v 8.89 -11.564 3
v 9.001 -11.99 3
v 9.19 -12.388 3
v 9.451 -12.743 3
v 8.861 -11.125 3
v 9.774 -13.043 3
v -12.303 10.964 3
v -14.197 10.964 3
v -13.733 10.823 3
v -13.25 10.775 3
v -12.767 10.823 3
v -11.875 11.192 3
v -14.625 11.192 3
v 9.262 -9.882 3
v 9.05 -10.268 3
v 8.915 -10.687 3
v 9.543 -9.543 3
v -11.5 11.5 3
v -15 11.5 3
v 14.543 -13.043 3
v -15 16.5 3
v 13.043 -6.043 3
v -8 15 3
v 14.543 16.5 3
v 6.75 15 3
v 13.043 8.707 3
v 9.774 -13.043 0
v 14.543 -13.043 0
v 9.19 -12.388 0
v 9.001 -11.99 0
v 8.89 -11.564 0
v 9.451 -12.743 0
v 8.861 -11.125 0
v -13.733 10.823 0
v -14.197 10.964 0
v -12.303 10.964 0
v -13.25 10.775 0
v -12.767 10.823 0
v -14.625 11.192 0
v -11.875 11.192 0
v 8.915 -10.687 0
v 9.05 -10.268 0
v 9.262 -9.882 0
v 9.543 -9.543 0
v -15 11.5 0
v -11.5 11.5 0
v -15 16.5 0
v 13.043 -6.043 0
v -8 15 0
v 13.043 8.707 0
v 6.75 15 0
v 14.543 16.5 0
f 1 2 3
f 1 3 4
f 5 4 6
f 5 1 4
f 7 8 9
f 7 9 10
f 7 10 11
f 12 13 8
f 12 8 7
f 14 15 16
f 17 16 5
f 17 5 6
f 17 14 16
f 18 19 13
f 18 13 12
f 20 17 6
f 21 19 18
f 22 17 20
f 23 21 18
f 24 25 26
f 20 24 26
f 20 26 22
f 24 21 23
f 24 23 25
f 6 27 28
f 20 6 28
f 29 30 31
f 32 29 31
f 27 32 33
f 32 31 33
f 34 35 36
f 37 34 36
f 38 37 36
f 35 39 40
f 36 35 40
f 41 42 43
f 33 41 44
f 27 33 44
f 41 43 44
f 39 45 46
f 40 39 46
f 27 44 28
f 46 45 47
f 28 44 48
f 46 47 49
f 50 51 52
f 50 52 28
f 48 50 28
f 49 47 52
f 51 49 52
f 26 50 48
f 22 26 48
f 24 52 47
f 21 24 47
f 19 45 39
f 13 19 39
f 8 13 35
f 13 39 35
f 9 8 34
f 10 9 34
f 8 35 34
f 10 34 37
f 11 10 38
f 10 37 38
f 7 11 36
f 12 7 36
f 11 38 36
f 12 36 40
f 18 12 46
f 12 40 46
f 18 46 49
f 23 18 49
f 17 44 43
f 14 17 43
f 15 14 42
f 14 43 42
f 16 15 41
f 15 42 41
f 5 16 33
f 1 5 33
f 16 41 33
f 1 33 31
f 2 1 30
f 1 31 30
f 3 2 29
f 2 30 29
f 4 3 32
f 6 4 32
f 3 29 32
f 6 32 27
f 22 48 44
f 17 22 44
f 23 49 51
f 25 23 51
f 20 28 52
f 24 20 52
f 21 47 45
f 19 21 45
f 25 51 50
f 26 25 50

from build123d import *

# Parameters (mm, degrees)
F1_DEPTH = 3


with BuildPart() as f1:
    # F0 (on Top) → F1 (new body)
    with BuildSketch(Plane.XY):
        with BuildLine():
            Line((-8, 15), (-0.625, 15))
            Line((-0.625, 15), (6.75, 15))
            Line((6.75, 15), (13.042543, 8.707457))
            Line((13.042543, 8.707457), (13.042543, 1.332457))
            Line((13.042543, 1.332457), (13.042543, -6.042543))
            Line((13.042543, -6.042543), (9.542543, -9.542543))
            ThreePointArc((9.542543, -9.542543), (8.864734, -11.345012), (9.773969, -13.042543))
            Line((9.773969, -13.042543), (14.542543, -13.042543))
            Line((14.542543, -13.042543), (14.542543, 16.5))
            Line((14.542543, 16.5), (-15, 16.5))
            Line((-15, 16.5), (-15, 11.5))
            ThreePointArc((-15, 11.5), (-13.25, 10.775126), (-11.5, 11.5))
            Line((-11.5, 11.5), (-8, 15))
        make_face()
    extrude(amount=F1_DEPTH)


solid = f1.part
